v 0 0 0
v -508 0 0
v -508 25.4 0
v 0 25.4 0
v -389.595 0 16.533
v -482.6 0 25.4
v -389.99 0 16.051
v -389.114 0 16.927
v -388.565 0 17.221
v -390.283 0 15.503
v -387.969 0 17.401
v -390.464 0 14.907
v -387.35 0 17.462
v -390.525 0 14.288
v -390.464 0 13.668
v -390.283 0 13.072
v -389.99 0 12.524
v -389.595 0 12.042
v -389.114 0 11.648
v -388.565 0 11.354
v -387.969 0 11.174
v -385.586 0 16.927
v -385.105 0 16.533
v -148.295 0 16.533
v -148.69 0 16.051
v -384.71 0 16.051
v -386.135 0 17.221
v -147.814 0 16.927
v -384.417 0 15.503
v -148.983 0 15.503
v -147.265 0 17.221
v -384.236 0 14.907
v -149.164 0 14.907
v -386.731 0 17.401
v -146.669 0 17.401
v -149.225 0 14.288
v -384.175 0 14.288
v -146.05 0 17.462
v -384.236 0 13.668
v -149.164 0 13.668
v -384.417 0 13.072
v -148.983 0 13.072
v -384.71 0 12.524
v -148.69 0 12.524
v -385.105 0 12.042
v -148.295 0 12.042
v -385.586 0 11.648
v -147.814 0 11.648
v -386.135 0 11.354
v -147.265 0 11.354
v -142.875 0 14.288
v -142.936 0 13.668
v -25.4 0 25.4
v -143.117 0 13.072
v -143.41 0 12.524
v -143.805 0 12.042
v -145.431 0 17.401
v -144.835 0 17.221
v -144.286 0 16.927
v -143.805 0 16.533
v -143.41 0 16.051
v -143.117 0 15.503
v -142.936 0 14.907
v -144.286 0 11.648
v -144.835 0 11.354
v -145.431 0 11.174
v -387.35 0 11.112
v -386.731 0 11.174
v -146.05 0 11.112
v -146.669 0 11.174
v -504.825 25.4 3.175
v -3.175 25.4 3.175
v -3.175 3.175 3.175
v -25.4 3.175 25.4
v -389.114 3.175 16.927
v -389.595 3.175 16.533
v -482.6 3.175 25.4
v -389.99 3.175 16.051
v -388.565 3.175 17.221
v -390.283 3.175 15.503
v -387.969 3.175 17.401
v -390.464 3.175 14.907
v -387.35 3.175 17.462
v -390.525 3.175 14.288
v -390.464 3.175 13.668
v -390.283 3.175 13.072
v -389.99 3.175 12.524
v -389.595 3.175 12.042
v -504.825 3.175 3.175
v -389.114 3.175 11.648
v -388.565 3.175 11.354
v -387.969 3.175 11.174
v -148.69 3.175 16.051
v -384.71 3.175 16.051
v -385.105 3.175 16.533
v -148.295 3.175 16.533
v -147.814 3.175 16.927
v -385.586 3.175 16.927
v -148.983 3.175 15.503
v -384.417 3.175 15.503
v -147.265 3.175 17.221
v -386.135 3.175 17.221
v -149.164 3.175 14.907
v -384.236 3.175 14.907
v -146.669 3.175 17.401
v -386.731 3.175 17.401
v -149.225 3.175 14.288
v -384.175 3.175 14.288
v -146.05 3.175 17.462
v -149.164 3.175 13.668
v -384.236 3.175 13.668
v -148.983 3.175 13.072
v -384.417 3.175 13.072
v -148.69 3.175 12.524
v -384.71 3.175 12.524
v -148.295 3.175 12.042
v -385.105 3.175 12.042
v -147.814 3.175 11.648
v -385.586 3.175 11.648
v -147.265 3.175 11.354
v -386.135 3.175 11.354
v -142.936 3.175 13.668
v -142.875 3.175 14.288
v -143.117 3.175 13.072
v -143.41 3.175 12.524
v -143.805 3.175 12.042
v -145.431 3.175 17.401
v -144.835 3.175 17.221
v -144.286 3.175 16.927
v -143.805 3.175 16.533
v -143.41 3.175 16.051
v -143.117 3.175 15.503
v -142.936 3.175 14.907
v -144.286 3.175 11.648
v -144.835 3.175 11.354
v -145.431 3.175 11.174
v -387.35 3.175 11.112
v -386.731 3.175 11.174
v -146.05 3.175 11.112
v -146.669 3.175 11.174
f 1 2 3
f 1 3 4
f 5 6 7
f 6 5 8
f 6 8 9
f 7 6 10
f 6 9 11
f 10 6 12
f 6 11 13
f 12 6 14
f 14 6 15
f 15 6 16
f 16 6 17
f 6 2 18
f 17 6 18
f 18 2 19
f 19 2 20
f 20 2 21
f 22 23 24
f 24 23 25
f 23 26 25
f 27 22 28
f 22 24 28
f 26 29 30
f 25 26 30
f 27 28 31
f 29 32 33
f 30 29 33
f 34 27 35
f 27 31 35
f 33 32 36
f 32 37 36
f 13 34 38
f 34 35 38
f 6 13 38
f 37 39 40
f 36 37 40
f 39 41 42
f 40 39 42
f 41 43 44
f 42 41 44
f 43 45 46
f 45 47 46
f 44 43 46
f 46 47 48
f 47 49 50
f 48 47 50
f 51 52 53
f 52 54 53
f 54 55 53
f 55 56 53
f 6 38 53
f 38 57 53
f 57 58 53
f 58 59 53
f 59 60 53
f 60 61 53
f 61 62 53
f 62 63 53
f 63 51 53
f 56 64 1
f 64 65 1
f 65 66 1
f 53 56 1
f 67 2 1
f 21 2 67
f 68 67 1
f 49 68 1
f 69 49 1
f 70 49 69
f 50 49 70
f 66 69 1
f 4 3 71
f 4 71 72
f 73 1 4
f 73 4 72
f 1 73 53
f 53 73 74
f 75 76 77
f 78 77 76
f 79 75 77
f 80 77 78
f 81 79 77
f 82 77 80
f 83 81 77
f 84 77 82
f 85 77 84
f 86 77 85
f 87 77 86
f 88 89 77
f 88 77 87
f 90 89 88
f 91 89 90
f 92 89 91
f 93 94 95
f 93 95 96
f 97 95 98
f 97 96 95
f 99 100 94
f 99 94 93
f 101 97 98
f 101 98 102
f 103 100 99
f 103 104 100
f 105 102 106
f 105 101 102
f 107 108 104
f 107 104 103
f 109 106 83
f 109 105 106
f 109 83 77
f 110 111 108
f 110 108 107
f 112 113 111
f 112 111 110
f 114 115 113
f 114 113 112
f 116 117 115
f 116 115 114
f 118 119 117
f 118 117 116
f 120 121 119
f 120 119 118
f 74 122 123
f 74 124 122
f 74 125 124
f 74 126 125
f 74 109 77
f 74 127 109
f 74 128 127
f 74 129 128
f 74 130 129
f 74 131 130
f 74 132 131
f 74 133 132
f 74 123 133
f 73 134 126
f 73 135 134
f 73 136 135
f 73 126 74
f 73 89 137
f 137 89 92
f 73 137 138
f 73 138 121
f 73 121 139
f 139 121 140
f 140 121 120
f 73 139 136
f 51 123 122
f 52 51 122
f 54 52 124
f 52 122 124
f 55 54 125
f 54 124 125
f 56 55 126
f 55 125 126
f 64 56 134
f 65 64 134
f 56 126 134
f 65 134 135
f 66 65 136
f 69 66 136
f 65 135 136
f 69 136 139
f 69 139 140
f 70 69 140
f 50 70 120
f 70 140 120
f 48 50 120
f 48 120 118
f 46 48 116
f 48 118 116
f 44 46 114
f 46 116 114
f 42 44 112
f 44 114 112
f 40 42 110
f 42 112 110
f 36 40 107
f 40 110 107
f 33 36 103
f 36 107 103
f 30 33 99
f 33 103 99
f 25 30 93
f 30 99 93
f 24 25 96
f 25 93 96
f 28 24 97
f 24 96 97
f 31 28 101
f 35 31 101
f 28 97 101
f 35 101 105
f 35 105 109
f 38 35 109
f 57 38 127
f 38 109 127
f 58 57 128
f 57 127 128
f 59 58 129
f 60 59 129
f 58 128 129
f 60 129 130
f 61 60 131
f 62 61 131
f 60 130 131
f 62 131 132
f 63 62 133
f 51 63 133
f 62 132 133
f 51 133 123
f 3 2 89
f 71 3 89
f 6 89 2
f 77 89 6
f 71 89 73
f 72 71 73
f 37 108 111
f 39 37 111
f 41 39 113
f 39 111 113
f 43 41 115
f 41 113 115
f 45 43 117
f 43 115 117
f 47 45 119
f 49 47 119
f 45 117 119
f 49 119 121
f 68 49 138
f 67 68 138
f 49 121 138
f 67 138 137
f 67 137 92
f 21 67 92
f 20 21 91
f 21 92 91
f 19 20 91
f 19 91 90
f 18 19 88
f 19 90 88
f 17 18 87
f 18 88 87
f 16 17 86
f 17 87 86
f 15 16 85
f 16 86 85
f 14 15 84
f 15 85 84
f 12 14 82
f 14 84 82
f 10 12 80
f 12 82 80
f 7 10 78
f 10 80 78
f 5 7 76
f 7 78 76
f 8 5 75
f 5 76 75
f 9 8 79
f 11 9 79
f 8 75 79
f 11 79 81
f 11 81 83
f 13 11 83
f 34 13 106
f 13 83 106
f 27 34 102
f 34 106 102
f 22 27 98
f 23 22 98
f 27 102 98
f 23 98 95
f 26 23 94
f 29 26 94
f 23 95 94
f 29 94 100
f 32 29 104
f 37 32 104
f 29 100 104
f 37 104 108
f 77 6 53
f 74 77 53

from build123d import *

# Parameters (mm, degrees)
SKETCH1_W           = 508
SKETCH1_H           = 25.4
BOSS_EXTRUDE1_DEPTH = 3.175
SKETCH2_W           = 508
SKETCH2_H           = 3.175
BOSS_EXTRUDE2_DEPTH = 22.225
CUT_EXTRUDE4_DEPTH  = 25.4
SKETCH6_R           = 3.175
CUT_EXTRUDE5_DEPTH  = 3.175
CUT_EXTRUDE6_DEPTH  = 25.4


with BuildPart() as part:
    # Sketch1 → Boss-Extrude1 (new body)
    with BuildSketch(Plane(origin=(0, 0, 0), x_dir=(1, 0, 0), z_dir=(0, 1, 0))):
        with Locations((-254, -12.7)):
            Rectangle(SKETCH1_W, SKETCH1_H)
    extrude(amount=BOSS_EXTRUDE1_DEPTH)

    # Sketch2 → Boss-Extrude2 (add)
    with BuildSketch(Plane(origin=(0, 3.175, 0), x_dir=(1, 0, 0), z_dir=(0, 1, 0))):
        with Locations((-254, -1.5875)):
            Rectangle(SKETCH2_W, SKETCH2_H)
    extrude(amount=BOSS_EXTRUDE2_DEPTH)

    # Sketch3 → Cut-Extrude4 (cut)
    with BuildSketch(Plane(origin=(0, 25.4, 0), x_dir=(1, 0, 0), z_dir=(0, 1, 0))):
        Polygon((0, 0), (-52.33160776, -52.33160776), (49.536132654, -29.784007044), align=None)
    extrude(amount=-CUT_EXTRUDE4_DEPTH, mode=Mode.SUBTRACT)

    # Sketch6 → Cut-Extrude5 (cut)
    with BuildSketch(Plane(origin=(0, 3.175, 0), x_dir=(1, 0, 0), z_dir=(0, 1, 0))):
        with Locations((-146.05, -14.2875)):
            Circle(SKETCH6_R)
        with Locations((-387.35, -14.2875)):
            Circle(SKETCH6_R)
    extrude(amount=-CUT_EXTRUDE5_DEPTH, mode=Mode.SUBTRACT)

    # Sketch7 → Cut-Extrude6 (cut)
    with BuildSketch(Plane(origin=(0, 25.4, 0), x_dir=(1, 0, 0), z_dir=(0, 1, 0))):
        Polygon((-508, 0), (-469.606769631, -38.393230369), (-537.121608827, -29.121608827), align=None)
    extrude(amount=-CUT_EXTRUDE6_DEPTH, mode=Mode.SUBTRACT)


solid = part.part
